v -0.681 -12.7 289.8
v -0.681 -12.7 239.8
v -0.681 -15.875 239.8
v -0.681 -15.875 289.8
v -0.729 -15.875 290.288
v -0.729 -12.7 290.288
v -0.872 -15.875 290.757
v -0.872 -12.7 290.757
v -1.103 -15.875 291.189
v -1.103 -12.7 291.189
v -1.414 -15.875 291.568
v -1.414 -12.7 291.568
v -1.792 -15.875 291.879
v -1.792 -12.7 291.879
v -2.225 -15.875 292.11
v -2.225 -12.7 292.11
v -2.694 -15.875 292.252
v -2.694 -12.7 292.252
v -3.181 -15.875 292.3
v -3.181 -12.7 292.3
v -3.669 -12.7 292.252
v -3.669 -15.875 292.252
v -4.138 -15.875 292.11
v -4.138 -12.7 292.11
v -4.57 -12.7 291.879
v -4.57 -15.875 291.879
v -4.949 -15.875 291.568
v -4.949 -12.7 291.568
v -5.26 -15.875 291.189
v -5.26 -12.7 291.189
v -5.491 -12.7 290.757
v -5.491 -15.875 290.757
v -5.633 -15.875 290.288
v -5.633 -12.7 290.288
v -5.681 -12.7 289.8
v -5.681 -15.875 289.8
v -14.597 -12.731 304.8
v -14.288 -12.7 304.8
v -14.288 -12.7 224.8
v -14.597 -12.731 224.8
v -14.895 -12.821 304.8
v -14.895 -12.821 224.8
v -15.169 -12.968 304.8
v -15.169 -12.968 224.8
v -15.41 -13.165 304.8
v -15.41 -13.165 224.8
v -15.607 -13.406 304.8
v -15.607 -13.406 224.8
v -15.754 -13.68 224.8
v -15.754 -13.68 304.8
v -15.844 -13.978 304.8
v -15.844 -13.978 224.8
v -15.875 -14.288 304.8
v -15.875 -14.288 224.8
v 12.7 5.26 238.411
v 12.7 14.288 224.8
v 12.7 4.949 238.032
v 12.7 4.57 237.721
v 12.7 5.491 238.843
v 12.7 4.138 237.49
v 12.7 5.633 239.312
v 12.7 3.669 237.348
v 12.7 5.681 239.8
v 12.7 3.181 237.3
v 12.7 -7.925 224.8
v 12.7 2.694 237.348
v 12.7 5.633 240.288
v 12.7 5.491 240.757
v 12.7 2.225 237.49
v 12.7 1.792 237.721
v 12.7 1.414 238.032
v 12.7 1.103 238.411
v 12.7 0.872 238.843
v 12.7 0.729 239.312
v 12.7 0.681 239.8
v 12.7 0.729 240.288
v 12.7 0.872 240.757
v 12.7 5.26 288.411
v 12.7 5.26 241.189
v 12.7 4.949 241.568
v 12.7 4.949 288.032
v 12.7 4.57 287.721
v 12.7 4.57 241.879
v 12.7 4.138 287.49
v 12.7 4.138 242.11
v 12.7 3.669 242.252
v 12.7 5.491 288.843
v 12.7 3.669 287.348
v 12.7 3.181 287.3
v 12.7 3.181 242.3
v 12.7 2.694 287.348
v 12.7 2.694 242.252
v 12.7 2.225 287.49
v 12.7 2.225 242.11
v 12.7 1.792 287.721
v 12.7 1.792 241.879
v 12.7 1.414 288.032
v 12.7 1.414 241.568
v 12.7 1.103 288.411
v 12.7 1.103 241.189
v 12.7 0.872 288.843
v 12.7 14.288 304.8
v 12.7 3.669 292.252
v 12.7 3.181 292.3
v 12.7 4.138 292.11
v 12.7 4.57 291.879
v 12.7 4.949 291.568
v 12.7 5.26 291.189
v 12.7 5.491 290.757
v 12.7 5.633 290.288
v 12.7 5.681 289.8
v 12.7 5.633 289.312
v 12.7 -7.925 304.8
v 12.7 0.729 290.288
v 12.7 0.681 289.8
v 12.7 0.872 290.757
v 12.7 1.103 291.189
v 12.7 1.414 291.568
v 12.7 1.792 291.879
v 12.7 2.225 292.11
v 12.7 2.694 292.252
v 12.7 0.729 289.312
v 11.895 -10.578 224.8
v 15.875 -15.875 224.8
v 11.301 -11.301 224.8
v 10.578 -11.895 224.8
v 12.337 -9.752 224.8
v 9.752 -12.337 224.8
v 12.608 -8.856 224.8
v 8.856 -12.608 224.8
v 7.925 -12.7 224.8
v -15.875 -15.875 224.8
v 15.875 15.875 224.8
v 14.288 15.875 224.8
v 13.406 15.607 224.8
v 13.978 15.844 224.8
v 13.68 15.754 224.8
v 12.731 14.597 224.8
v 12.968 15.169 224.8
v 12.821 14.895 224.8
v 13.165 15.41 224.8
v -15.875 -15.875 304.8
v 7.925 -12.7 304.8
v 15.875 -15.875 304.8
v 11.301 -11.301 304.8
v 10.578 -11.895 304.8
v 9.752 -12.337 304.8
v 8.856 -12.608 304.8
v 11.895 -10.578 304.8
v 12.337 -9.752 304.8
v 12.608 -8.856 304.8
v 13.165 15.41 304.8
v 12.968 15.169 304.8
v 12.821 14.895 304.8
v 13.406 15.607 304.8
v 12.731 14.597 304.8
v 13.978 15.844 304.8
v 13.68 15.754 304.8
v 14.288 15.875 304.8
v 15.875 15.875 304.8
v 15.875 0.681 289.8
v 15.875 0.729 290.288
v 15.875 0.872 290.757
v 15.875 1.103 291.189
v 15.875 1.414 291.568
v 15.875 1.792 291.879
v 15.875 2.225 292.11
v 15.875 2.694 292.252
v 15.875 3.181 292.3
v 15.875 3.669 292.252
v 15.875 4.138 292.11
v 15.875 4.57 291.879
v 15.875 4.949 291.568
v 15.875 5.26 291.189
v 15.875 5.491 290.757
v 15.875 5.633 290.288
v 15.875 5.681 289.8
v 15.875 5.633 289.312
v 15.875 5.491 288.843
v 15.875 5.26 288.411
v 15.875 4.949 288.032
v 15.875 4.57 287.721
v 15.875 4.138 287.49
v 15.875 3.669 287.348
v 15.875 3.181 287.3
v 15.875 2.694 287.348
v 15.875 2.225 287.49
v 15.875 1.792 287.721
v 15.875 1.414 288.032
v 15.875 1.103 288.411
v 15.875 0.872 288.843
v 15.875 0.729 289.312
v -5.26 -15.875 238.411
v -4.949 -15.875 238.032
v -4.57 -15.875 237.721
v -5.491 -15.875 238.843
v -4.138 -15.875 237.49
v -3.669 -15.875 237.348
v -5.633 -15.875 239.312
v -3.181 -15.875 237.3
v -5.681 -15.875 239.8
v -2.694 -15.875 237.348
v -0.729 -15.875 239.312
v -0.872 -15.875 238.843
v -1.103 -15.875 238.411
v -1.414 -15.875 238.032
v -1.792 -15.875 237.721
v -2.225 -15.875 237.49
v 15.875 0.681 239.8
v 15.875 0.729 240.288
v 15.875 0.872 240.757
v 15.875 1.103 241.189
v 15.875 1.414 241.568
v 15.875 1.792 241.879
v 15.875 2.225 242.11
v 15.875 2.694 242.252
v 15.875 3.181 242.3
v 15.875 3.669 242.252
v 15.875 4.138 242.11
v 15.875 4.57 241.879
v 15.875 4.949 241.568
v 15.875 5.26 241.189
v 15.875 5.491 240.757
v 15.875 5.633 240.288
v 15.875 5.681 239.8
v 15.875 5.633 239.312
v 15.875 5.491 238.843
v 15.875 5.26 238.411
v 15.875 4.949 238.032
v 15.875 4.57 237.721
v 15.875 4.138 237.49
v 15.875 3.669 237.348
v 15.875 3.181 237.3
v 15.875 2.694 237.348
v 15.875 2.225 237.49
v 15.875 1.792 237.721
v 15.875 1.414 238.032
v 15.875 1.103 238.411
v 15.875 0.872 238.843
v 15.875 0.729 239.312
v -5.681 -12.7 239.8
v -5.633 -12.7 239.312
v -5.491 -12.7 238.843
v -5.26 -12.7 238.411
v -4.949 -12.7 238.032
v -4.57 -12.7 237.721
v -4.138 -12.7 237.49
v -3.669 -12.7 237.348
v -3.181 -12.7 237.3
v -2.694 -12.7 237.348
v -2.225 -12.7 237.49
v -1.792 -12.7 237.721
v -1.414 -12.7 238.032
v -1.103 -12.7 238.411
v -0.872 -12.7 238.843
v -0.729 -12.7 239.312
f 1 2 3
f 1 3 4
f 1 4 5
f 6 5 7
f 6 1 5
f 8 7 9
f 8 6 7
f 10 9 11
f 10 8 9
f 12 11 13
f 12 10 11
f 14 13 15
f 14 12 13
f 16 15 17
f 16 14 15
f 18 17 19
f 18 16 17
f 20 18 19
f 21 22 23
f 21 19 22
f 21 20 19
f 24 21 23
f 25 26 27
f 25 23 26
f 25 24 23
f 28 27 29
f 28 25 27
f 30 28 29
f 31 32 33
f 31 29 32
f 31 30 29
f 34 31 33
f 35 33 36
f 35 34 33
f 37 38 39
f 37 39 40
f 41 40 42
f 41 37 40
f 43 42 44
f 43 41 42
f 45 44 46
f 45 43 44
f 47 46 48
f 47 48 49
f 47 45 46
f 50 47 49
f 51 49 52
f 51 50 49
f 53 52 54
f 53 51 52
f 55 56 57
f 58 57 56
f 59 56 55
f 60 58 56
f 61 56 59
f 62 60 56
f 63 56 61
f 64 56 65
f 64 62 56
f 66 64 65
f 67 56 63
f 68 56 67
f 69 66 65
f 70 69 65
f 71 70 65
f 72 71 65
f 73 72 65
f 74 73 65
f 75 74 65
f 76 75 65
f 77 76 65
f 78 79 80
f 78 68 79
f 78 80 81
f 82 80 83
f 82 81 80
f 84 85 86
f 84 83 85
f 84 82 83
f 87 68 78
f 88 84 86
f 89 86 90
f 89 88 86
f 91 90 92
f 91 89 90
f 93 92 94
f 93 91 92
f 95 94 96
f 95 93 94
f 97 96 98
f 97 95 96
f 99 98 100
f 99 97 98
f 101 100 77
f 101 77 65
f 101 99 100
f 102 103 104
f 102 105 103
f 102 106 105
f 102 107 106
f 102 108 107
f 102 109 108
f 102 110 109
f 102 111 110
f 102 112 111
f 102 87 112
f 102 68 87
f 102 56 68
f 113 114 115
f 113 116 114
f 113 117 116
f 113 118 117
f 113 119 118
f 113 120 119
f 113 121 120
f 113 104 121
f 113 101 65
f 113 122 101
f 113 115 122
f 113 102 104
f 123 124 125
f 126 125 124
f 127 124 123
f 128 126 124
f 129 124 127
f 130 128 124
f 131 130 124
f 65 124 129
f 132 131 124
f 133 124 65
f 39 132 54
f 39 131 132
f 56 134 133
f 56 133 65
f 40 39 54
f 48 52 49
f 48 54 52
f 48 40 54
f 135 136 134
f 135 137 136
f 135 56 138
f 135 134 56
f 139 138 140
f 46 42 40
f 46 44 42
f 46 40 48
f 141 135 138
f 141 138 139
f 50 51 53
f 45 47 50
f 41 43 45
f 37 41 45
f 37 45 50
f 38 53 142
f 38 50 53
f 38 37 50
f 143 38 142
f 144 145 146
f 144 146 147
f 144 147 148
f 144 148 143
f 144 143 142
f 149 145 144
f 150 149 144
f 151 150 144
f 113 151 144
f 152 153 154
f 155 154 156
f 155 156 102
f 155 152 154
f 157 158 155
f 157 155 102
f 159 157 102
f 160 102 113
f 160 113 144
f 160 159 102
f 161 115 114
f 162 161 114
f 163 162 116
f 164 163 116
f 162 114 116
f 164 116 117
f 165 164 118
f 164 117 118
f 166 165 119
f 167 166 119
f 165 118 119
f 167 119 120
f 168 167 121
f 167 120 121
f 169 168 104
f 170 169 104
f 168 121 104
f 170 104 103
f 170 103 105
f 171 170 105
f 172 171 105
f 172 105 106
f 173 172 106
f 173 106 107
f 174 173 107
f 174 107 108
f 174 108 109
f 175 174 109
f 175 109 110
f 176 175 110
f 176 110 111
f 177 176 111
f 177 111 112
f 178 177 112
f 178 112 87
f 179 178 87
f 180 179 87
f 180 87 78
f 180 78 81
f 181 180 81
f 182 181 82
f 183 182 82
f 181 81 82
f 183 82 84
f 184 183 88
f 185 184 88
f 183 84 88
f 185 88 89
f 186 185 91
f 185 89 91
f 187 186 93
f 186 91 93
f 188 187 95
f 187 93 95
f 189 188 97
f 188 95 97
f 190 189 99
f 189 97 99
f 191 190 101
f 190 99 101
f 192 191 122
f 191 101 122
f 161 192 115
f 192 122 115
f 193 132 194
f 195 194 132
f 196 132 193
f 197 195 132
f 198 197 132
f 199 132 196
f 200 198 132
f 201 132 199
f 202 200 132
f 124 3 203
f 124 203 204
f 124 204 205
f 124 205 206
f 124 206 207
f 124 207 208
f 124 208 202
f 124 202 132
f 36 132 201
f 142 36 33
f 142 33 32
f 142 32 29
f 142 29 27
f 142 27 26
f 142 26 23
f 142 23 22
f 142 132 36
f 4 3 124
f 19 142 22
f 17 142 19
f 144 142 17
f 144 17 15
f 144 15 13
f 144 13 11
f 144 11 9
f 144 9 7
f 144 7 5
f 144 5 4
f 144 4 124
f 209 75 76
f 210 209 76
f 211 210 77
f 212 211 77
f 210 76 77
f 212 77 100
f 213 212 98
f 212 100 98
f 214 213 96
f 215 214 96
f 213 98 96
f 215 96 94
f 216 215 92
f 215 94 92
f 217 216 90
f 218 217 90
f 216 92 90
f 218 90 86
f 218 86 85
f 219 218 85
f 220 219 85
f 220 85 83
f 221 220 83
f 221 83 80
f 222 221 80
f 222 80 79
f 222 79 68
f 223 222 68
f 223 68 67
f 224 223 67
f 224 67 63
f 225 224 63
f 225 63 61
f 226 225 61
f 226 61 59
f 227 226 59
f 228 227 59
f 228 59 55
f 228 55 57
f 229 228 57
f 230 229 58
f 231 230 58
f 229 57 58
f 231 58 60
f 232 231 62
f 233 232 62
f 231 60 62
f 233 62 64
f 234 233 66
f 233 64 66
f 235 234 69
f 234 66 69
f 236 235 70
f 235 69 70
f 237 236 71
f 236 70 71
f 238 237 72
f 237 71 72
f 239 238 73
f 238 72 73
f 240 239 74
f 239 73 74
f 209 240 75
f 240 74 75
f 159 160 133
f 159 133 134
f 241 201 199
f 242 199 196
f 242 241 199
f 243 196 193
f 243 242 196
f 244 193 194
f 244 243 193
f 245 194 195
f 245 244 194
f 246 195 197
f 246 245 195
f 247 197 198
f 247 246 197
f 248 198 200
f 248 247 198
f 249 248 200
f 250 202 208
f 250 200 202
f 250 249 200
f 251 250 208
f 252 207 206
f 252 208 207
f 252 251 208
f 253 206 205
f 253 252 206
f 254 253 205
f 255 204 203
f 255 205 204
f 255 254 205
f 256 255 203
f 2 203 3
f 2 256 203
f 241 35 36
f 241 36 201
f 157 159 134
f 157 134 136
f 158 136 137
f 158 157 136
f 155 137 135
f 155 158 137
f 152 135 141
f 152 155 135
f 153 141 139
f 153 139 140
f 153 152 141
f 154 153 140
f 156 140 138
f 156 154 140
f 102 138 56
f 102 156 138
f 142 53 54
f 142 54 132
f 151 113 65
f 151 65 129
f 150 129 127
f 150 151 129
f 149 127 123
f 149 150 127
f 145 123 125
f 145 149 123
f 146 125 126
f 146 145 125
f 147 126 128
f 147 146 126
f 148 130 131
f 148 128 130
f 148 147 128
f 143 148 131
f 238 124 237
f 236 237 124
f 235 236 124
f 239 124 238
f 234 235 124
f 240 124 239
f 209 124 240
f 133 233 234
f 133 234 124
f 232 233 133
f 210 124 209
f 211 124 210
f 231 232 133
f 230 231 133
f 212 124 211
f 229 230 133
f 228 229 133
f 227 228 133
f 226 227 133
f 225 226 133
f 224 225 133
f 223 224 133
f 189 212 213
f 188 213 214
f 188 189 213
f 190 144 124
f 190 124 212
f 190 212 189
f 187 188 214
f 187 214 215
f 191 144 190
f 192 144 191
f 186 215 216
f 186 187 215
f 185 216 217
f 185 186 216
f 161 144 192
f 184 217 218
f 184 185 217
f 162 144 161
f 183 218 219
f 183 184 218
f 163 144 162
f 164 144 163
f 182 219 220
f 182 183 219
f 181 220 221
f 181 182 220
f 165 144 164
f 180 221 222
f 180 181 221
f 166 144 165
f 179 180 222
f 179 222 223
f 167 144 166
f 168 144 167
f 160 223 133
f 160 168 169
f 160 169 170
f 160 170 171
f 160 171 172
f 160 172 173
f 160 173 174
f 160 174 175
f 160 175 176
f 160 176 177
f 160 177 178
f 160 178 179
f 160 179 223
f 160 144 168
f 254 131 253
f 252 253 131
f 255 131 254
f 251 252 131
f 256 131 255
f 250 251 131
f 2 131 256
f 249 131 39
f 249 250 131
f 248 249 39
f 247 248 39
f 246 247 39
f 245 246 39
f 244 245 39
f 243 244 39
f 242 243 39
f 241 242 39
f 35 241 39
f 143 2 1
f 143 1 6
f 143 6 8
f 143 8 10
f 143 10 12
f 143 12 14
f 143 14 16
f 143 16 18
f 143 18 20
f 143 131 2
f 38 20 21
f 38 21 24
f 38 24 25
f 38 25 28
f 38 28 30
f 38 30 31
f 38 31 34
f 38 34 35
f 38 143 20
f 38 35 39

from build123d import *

# Parameters (mm, degrees)
BOSS_EXTRUDE1_DEPTH = 304.8
SKETCH3_W           = 34.414454966
SKETCH3_H           = 33.657940314
CUT_EXTRUDE1_DEPTH  = 529.6
SKETCH5_R           = 2.5
CUT_EXTRUDE2_DEPTH  = 101.6
CUT_EXTRUDE3_DEPTH  = 101.6


with BuildPart() as part:
    # Sketch2 → Boss-Extrude1 (new, symmetric)
    with BuildSketch(Plane.XY):
        with BuildLine():
            Line((-15.875, -15.875), (15.875, -15.875))
            Line((15.875, -15.875), (15.875, 15.875))
            Line((15.875, 15.875), (14.2875, 15.875))
            ThreePointArc((14.2875, 15.875), (13.164967985, 15.410032015), (12.7, 14.2875))
            Line((12.7, 14.2875), (12.7, -7.9248))
            ThreePointArc((12.7, -7.9248), (11.301376302, -11.301376302), (7.9248, -12.7))
            Line((7.9248, -12.7), (-14.2875, -12.7))
            ThreePointArc((-14.2875, -12.7), (-15.410032015, -13.164967985), (-15.875, -14.2875))
            Line((-15.875, -14.2875), (-15.875, -15.875))
        make_face()
    extrude(amount=BOSS_EXTRUDE1_DEPTH, both=True)

    # Sketch3 → Cut-Extrude1 (cut)
    with BuildSketch(Plane(origin=(0, 0, -304.8), x_dir=(-1, 0, 0), z_dir=(0, 0, -1))):
        with Locations((1.332227483, 0.953970157)):
            Rectangle(SKETCH3_W, SKETCH3_H)
    extrude(amount=-CUT_EXTRUDE1_DEPTH, mode=Mode.SUBTRACT)

    # Sketch5 → Cut-Extrude2 (cut)
    with BuildSketch(Plane.ZY.offset(-12.7)):
        with Locations(Location((289.8, 3.18135, 0), (0, 0, 270))):
            Circle(SKETCH5_R)
        with Locations(Location((239.8, 3.18135, 0), (0, 0, 270))):
            Circle(SKETCH5_R)
    extrude(amount=-CUT_EXTRUDE2_DEPTH, mode=Mode.SUBTRACT)

    # Sketch4 → Cut-Extrude3 (cut)
    with BuildSketch(Plane(origin=(0, -12.7, 0), x_dir=(1, 0, 0), z_dir=(0, 1, 0))):
        with BuildLine():
            Line((-0.68135, -239.8), (-0.68135, -289.8))
            ThreePointArc((-0.68135, -289.8), (-3.18135, -292.3), (-5.68135, -289.8))
            Line((-5.68135, -289.8), (-5.68135, -239.8))
            ThreePointArc((-5.68135, -239.8), (-3.18135, -237.3), (-0.68135, -239.8))
        make_face()
    extrude(amount=-CUT_EXTRUDE3_DEPTH, mode=Mode.SUBTRACT)


solid = part.part
